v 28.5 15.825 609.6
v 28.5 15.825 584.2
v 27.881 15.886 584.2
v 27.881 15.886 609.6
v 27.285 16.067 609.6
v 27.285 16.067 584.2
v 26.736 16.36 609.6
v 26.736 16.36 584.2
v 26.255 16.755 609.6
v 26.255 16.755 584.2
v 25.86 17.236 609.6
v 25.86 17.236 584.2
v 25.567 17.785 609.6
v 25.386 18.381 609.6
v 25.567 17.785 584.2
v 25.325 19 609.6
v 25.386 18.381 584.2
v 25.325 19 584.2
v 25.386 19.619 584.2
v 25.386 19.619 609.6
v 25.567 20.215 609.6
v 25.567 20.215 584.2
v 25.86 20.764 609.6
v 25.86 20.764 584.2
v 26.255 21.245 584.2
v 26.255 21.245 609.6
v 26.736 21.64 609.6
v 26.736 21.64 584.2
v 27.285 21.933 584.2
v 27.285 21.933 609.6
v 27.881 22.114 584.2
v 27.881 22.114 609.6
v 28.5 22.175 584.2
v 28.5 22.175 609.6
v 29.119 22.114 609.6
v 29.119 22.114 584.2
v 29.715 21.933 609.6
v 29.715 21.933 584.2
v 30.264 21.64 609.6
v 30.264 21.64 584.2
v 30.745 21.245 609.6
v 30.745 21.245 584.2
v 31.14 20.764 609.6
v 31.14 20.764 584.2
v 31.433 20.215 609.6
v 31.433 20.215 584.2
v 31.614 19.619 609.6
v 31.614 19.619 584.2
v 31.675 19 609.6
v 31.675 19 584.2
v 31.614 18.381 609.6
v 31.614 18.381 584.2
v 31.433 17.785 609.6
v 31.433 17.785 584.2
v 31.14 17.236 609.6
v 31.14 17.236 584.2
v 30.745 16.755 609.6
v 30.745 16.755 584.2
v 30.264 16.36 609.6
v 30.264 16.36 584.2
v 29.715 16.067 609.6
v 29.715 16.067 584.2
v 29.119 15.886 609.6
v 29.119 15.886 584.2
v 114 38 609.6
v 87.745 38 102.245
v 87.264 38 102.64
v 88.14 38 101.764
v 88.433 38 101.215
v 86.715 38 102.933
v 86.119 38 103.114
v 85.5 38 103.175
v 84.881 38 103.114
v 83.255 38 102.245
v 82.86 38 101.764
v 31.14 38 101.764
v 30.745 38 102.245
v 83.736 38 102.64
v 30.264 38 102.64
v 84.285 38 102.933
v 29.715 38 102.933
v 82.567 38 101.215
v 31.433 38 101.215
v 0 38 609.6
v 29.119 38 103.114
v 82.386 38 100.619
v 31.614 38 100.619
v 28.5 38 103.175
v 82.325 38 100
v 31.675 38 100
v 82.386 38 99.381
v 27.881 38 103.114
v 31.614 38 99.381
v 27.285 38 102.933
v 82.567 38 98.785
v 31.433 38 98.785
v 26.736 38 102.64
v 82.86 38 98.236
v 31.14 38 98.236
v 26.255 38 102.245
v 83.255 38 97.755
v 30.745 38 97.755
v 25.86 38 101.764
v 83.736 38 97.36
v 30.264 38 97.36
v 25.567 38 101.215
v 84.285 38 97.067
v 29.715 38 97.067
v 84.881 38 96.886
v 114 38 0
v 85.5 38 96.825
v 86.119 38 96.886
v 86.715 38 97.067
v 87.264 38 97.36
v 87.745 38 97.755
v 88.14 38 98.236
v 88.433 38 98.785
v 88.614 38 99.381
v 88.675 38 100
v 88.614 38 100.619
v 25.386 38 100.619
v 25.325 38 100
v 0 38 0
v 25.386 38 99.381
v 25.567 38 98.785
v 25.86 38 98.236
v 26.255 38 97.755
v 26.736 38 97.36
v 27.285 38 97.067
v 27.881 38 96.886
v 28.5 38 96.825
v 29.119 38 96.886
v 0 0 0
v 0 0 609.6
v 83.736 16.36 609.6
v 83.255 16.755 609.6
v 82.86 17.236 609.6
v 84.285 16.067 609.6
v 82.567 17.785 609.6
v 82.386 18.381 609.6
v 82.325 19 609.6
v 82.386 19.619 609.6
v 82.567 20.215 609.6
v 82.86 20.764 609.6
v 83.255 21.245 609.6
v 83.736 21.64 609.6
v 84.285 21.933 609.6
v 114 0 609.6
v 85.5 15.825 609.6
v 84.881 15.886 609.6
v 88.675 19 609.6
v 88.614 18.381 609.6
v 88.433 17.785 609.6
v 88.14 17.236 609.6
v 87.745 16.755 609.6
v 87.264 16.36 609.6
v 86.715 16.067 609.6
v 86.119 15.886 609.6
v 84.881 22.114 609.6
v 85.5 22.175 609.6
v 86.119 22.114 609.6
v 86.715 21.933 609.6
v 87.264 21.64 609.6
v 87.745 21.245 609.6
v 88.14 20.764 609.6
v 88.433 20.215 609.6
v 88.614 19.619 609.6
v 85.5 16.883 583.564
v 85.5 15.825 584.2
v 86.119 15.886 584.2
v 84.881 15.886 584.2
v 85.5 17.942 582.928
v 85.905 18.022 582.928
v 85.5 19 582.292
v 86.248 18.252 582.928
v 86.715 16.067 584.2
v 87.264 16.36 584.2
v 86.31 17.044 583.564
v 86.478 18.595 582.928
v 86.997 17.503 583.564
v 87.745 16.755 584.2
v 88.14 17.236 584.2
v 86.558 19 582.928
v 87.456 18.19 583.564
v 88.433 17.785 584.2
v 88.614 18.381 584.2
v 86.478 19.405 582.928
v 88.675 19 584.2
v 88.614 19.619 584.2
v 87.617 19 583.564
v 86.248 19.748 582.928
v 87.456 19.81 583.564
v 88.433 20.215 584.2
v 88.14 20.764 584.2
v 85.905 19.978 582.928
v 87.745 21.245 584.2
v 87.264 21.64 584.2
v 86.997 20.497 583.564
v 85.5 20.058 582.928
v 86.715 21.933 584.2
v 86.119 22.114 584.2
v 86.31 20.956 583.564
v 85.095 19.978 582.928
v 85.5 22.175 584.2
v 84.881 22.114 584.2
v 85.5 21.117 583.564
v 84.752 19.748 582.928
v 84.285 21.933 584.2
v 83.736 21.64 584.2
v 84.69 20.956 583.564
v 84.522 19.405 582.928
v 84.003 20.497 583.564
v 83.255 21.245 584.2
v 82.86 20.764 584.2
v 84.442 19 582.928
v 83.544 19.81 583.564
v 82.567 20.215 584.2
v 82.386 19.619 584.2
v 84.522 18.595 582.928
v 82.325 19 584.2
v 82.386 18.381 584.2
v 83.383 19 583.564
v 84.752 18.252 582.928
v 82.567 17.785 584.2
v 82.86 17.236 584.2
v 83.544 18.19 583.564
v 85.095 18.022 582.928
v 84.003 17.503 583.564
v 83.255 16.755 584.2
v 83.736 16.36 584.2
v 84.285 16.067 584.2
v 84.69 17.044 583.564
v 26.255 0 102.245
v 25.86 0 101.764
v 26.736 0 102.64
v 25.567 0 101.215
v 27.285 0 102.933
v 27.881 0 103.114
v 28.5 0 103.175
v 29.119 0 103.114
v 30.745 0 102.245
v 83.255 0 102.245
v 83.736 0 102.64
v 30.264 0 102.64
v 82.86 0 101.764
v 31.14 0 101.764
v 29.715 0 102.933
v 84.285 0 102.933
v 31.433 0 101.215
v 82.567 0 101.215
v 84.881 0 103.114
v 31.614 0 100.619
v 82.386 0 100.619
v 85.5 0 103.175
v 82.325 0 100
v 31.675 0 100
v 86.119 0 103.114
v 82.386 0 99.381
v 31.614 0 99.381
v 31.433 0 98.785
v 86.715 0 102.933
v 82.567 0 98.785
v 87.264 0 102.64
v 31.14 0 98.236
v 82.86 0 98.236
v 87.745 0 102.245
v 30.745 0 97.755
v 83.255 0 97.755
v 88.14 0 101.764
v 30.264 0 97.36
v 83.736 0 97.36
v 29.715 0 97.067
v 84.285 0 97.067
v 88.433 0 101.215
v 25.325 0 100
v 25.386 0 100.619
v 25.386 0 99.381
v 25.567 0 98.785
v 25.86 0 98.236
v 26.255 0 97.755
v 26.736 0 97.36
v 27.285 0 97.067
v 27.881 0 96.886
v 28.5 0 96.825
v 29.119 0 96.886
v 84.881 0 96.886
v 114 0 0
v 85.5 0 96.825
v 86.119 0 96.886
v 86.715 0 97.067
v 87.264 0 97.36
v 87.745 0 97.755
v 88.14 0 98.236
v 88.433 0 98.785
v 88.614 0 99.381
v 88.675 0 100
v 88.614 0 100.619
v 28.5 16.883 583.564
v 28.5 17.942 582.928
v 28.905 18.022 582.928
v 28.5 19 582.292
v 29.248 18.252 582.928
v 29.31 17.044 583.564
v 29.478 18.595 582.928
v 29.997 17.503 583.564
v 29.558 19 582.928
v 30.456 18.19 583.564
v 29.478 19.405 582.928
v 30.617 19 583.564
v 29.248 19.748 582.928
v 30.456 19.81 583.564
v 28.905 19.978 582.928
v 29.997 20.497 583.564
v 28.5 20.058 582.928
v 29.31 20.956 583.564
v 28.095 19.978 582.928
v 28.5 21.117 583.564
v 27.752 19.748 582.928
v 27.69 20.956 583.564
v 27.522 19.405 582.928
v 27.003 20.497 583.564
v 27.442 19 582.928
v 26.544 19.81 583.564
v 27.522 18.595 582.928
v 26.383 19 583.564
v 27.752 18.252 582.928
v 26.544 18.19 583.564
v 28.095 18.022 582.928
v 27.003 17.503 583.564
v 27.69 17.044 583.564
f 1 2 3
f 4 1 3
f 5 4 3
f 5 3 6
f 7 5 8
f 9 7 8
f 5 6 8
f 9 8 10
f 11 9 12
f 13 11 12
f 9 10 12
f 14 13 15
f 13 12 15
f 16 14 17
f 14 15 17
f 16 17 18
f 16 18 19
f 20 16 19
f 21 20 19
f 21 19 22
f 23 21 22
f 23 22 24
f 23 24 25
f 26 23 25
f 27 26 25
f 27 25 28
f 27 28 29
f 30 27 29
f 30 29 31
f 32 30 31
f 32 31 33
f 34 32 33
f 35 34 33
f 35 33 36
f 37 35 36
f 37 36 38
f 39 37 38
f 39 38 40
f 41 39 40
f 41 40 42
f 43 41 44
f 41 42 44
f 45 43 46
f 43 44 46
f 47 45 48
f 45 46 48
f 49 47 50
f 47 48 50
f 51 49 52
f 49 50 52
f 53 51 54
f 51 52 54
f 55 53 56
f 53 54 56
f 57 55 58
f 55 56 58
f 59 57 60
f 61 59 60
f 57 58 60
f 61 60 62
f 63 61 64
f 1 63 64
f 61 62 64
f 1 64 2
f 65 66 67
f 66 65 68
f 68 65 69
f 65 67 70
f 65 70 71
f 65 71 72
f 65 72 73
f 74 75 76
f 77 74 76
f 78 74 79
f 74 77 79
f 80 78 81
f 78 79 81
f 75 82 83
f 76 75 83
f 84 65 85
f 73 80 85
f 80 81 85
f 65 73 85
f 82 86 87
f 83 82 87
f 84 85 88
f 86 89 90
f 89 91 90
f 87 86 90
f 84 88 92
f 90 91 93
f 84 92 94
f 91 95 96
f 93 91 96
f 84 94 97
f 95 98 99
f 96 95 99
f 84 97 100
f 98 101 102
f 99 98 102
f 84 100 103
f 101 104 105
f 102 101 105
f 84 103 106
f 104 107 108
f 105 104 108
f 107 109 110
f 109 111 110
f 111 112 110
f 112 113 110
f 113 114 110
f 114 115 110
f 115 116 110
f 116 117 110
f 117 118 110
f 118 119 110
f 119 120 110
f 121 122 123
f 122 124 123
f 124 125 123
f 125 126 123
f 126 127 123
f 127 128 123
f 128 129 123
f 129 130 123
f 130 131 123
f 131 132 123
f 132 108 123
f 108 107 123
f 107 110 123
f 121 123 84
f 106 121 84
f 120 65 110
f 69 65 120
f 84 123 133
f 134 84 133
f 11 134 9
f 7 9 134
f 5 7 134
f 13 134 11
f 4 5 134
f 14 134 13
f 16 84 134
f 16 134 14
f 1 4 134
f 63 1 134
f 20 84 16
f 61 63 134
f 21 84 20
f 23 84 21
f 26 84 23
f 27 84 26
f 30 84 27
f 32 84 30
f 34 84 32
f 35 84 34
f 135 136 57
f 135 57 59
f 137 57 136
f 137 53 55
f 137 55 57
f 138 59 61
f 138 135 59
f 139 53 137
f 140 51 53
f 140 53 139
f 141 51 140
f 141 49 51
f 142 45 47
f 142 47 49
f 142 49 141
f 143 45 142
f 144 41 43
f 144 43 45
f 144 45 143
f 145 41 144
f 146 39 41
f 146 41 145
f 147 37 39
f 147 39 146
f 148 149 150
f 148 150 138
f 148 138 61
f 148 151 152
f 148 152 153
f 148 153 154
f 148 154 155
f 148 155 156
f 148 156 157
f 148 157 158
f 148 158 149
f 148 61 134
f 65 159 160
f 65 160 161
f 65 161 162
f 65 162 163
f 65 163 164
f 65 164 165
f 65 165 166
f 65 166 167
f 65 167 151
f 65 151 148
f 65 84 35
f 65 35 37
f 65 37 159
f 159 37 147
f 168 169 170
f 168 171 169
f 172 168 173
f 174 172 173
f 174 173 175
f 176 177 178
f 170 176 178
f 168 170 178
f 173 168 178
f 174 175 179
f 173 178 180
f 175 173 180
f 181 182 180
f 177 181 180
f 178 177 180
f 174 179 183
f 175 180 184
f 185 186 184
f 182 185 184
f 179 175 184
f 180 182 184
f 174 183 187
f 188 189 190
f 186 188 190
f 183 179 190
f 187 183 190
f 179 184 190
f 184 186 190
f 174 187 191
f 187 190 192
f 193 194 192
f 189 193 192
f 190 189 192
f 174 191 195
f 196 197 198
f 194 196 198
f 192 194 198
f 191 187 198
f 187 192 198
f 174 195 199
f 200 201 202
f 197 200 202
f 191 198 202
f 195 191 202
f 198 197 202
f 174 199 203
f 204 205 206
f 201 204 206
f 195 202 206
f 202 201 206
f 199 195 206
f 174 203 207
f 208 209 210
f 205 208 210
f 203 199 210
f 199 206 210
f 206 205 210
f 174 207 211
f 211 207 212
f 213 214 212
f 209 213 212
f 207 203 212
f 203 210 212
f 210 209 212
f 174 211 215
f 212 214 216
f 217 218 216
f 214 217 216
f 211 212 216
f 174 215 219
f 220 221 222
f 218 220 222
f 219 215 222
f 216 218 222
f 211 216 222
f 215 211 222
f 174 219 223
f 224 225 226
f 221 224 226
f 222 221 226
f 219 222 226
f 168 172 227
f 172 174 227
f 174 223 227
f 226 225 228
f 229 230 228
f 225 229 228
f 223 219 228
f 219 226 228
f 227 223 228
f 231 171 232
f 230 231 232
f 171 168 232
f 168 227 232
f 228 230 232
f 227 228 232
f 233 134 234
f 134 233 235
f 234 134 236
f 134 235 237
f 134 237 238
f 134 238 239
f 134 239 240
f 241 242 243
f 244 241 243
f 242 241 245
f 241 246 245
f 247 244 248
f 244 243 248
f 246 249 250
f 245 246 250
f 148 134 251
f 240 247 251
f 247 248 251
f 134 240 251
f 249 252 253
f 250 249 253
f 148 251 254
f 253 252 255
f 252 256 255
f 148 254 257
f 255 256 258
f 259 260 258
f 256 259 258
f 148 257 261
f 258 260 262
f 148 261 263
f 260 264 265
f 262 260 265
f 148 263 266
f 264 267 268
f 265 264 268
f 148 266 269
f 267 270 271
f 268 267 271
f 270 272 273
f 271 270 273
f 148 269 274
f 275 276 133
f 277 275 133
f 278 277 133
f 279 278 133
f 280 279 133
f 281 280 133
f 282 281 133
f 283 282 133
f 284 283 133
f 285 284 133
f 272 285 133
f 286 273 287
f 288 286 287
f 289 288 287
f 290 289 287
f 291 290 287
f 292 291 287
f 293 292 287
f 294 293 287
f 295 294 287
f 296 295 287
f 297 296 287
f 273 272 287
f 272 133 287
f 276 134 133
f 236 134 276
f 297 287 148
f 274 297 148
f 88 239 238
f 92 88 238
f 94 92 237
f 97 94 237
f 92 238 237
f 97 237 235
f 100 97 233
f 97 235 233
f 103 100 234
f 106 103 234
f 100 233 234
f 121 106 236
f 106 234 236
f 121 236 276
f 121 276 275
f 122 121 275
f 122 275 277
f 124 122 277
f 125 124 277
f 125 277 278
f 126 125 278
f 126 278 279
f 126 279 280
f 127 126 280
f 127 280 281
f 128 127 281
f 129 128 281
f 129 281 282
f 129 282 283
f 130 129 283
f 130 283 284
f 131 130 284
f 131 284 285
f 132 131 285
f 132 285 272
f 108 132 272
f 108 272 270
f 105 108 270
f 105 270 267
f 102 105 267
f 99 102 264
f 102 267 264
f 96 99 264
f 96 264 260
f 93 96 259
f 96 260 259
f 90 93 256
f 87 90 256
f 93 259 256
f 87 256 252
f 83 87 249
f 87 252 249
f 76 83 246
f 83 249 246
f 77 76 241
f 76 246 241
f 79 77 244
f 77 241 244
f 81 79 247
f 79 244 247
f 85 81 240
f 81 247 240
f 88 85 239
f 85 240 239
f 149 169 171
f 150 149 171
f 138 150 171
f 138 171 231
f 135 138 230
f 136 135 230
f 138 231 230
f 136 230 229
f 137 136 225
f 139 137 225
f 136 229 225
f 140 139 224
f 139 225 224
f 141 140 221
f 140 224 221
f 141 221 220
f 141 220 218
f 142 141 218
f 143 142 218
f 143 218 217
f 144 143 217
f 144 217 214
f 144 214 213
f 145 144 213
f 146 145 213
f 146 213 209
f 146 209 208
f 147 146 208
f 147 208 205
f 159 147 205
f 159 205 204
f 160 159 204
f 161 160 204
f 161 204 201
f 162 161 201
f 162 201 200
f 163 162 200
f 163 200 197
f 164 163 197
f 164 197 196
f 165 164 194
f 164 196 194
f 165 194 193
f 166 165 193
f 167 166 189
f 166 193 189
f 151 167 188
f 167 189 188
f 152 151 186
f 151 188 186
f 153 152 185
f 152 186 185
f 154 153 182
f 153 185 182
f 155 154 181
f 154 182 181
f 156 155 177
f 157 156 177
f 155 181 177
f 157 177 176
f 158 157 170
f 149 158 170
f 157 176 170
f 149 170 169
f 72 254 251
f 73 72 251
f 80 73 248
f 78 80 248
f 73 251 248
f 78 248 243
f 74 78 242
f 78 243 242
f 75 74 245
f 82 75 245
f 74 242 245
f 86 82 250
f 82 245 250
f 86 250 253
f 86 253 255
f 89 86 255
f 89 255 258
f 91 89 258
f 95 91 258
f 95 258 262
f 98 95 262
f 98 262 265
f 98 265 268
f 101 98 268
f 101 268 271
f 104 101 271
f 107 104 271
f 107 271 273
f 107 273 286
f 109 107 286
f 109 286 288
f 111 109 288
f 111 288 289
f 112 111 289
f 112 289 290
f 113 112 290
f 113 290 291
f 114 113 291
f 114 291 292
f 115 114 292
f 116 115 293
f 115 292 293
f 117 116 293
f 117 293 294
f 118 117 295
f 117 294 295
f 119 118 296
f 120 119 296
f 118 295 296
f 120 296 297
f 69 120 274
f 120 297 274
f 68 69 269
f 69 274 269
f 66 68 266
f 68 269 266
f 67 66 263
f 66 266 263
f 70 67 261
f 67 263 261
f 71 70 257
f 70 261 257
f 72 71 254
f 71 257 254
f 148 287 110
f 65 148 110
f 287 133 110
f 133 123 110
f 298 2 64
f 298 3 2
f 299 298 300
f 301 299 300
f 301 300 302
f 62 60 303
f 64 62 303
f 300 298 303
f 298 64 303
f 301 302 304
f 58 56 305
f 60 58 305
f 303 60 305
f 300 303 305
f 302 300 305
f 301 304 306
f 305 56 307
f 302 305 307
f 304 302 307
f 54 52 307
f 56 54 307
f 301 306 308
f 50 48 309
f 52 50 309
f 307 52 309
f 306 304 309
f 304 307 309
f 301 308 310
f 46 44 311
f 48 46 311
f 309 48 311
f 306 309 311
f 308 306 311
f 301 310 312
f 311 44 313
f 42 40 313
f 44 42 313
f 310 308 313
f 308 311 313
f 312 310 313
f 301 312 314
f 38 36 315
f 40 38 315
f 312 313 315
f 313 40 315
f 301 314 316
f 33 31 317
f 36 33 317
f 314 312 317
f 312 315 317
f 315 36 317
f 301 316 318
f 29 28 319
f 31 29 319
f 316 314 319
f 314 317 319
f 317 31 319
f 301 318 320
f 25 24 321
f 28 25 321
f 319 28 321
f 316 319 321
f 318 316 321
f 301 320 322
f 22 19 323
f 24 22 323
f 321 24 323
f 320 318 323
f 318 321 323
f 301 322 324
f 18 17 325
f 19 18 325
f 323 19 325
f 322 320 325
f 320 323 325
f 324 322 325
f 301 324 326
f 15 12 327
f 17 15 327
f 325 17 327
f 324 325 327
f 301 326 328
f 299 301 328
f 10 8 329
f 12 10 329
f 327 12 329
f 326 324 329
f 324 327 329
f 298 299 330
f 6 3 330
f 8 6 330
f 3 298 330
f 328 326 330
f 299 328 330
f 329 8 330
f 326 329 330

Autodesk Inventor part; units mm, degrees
ref_plane "YZ Plane" through (0, 0, 0) normal (1, 0, 0) x (0, 1, 0)
ref_plane "XZ Plane" through (0, 0, 0) normal (0, 1, 0) x (-1, 0, 0)
ref_plane "XY Plane" through (0, 0, 0) normal (0, 0, 1) x (1, 0, 0)
sketch "Sketch1" plane through (0, 0, 0) normal (0, 0, 1) x (1, 0, 0)
  line L0 (0, 0) -> (114, 0)
  line L1 (114, 0) -> (114, 38)
  line L2 (114, 38) -> (0, 38)
  line L3 (0, 38) -> (0, 0)
  dimension "d0" = 114
  dimension "d1" = 38
extrude "Extrusion1" add sketch "Sketch1" along normal blind 609.6
sketch "Sketch2" plane through (0, 0, 609.6) normal (0, 0, 1) x (1, 0, 0)
  line L0 (0, 0) -> (114, 0) projected
  circle A0 centre (28.5, 19) radius 5.7238
  circle A1 centre (85.5, 19) radius 5.7238
  line L1 (114, 38) -> (0, 38) projected
  line L2 (57, 38) -> (57, 0) construction
  line L3 (28.5, 19) -> (85.5, 19) construction
  line L4 (57, 19) -> (57, 23.2884) construction
  dimension "d7" = 57
hole "Hole1" at (28.5, 19, 609.6) at (85.5, 19, 609.6) direction (0, 0, -1) diameter 6.35 depth 25.4 tip angle 118
sketch "Sketch3" plane through (0, 38, 0) normal (0, 1, 0) x (1, 0, 0)
  line L0 (114, 0) -> (0, 0) projected
  circle A0 centre (28.5, -100) radius 3.5498
  circle A1 centre (85.5, -100) radius 3.5498
  line L1 (114, 0) -> (114, -609.6) projected
  line L2 (57, 0) -> (57, -100) construction
  line L3 (28.5, -100) -> (85.5, -100) construction
  dimension "d23" = 57
  dimension "d36" = 100
hole "Hole2" at (85.5, 38, 100) at (28.5, 38, 100) direction (0, -1, 0) diameter 6.35 end through all
equation "\"d7\" = 0.5 * d0"
equation "\"d23\" = 0.5 * d0"
properties part number "2p2psh1" material "Wood (Cherry)"
